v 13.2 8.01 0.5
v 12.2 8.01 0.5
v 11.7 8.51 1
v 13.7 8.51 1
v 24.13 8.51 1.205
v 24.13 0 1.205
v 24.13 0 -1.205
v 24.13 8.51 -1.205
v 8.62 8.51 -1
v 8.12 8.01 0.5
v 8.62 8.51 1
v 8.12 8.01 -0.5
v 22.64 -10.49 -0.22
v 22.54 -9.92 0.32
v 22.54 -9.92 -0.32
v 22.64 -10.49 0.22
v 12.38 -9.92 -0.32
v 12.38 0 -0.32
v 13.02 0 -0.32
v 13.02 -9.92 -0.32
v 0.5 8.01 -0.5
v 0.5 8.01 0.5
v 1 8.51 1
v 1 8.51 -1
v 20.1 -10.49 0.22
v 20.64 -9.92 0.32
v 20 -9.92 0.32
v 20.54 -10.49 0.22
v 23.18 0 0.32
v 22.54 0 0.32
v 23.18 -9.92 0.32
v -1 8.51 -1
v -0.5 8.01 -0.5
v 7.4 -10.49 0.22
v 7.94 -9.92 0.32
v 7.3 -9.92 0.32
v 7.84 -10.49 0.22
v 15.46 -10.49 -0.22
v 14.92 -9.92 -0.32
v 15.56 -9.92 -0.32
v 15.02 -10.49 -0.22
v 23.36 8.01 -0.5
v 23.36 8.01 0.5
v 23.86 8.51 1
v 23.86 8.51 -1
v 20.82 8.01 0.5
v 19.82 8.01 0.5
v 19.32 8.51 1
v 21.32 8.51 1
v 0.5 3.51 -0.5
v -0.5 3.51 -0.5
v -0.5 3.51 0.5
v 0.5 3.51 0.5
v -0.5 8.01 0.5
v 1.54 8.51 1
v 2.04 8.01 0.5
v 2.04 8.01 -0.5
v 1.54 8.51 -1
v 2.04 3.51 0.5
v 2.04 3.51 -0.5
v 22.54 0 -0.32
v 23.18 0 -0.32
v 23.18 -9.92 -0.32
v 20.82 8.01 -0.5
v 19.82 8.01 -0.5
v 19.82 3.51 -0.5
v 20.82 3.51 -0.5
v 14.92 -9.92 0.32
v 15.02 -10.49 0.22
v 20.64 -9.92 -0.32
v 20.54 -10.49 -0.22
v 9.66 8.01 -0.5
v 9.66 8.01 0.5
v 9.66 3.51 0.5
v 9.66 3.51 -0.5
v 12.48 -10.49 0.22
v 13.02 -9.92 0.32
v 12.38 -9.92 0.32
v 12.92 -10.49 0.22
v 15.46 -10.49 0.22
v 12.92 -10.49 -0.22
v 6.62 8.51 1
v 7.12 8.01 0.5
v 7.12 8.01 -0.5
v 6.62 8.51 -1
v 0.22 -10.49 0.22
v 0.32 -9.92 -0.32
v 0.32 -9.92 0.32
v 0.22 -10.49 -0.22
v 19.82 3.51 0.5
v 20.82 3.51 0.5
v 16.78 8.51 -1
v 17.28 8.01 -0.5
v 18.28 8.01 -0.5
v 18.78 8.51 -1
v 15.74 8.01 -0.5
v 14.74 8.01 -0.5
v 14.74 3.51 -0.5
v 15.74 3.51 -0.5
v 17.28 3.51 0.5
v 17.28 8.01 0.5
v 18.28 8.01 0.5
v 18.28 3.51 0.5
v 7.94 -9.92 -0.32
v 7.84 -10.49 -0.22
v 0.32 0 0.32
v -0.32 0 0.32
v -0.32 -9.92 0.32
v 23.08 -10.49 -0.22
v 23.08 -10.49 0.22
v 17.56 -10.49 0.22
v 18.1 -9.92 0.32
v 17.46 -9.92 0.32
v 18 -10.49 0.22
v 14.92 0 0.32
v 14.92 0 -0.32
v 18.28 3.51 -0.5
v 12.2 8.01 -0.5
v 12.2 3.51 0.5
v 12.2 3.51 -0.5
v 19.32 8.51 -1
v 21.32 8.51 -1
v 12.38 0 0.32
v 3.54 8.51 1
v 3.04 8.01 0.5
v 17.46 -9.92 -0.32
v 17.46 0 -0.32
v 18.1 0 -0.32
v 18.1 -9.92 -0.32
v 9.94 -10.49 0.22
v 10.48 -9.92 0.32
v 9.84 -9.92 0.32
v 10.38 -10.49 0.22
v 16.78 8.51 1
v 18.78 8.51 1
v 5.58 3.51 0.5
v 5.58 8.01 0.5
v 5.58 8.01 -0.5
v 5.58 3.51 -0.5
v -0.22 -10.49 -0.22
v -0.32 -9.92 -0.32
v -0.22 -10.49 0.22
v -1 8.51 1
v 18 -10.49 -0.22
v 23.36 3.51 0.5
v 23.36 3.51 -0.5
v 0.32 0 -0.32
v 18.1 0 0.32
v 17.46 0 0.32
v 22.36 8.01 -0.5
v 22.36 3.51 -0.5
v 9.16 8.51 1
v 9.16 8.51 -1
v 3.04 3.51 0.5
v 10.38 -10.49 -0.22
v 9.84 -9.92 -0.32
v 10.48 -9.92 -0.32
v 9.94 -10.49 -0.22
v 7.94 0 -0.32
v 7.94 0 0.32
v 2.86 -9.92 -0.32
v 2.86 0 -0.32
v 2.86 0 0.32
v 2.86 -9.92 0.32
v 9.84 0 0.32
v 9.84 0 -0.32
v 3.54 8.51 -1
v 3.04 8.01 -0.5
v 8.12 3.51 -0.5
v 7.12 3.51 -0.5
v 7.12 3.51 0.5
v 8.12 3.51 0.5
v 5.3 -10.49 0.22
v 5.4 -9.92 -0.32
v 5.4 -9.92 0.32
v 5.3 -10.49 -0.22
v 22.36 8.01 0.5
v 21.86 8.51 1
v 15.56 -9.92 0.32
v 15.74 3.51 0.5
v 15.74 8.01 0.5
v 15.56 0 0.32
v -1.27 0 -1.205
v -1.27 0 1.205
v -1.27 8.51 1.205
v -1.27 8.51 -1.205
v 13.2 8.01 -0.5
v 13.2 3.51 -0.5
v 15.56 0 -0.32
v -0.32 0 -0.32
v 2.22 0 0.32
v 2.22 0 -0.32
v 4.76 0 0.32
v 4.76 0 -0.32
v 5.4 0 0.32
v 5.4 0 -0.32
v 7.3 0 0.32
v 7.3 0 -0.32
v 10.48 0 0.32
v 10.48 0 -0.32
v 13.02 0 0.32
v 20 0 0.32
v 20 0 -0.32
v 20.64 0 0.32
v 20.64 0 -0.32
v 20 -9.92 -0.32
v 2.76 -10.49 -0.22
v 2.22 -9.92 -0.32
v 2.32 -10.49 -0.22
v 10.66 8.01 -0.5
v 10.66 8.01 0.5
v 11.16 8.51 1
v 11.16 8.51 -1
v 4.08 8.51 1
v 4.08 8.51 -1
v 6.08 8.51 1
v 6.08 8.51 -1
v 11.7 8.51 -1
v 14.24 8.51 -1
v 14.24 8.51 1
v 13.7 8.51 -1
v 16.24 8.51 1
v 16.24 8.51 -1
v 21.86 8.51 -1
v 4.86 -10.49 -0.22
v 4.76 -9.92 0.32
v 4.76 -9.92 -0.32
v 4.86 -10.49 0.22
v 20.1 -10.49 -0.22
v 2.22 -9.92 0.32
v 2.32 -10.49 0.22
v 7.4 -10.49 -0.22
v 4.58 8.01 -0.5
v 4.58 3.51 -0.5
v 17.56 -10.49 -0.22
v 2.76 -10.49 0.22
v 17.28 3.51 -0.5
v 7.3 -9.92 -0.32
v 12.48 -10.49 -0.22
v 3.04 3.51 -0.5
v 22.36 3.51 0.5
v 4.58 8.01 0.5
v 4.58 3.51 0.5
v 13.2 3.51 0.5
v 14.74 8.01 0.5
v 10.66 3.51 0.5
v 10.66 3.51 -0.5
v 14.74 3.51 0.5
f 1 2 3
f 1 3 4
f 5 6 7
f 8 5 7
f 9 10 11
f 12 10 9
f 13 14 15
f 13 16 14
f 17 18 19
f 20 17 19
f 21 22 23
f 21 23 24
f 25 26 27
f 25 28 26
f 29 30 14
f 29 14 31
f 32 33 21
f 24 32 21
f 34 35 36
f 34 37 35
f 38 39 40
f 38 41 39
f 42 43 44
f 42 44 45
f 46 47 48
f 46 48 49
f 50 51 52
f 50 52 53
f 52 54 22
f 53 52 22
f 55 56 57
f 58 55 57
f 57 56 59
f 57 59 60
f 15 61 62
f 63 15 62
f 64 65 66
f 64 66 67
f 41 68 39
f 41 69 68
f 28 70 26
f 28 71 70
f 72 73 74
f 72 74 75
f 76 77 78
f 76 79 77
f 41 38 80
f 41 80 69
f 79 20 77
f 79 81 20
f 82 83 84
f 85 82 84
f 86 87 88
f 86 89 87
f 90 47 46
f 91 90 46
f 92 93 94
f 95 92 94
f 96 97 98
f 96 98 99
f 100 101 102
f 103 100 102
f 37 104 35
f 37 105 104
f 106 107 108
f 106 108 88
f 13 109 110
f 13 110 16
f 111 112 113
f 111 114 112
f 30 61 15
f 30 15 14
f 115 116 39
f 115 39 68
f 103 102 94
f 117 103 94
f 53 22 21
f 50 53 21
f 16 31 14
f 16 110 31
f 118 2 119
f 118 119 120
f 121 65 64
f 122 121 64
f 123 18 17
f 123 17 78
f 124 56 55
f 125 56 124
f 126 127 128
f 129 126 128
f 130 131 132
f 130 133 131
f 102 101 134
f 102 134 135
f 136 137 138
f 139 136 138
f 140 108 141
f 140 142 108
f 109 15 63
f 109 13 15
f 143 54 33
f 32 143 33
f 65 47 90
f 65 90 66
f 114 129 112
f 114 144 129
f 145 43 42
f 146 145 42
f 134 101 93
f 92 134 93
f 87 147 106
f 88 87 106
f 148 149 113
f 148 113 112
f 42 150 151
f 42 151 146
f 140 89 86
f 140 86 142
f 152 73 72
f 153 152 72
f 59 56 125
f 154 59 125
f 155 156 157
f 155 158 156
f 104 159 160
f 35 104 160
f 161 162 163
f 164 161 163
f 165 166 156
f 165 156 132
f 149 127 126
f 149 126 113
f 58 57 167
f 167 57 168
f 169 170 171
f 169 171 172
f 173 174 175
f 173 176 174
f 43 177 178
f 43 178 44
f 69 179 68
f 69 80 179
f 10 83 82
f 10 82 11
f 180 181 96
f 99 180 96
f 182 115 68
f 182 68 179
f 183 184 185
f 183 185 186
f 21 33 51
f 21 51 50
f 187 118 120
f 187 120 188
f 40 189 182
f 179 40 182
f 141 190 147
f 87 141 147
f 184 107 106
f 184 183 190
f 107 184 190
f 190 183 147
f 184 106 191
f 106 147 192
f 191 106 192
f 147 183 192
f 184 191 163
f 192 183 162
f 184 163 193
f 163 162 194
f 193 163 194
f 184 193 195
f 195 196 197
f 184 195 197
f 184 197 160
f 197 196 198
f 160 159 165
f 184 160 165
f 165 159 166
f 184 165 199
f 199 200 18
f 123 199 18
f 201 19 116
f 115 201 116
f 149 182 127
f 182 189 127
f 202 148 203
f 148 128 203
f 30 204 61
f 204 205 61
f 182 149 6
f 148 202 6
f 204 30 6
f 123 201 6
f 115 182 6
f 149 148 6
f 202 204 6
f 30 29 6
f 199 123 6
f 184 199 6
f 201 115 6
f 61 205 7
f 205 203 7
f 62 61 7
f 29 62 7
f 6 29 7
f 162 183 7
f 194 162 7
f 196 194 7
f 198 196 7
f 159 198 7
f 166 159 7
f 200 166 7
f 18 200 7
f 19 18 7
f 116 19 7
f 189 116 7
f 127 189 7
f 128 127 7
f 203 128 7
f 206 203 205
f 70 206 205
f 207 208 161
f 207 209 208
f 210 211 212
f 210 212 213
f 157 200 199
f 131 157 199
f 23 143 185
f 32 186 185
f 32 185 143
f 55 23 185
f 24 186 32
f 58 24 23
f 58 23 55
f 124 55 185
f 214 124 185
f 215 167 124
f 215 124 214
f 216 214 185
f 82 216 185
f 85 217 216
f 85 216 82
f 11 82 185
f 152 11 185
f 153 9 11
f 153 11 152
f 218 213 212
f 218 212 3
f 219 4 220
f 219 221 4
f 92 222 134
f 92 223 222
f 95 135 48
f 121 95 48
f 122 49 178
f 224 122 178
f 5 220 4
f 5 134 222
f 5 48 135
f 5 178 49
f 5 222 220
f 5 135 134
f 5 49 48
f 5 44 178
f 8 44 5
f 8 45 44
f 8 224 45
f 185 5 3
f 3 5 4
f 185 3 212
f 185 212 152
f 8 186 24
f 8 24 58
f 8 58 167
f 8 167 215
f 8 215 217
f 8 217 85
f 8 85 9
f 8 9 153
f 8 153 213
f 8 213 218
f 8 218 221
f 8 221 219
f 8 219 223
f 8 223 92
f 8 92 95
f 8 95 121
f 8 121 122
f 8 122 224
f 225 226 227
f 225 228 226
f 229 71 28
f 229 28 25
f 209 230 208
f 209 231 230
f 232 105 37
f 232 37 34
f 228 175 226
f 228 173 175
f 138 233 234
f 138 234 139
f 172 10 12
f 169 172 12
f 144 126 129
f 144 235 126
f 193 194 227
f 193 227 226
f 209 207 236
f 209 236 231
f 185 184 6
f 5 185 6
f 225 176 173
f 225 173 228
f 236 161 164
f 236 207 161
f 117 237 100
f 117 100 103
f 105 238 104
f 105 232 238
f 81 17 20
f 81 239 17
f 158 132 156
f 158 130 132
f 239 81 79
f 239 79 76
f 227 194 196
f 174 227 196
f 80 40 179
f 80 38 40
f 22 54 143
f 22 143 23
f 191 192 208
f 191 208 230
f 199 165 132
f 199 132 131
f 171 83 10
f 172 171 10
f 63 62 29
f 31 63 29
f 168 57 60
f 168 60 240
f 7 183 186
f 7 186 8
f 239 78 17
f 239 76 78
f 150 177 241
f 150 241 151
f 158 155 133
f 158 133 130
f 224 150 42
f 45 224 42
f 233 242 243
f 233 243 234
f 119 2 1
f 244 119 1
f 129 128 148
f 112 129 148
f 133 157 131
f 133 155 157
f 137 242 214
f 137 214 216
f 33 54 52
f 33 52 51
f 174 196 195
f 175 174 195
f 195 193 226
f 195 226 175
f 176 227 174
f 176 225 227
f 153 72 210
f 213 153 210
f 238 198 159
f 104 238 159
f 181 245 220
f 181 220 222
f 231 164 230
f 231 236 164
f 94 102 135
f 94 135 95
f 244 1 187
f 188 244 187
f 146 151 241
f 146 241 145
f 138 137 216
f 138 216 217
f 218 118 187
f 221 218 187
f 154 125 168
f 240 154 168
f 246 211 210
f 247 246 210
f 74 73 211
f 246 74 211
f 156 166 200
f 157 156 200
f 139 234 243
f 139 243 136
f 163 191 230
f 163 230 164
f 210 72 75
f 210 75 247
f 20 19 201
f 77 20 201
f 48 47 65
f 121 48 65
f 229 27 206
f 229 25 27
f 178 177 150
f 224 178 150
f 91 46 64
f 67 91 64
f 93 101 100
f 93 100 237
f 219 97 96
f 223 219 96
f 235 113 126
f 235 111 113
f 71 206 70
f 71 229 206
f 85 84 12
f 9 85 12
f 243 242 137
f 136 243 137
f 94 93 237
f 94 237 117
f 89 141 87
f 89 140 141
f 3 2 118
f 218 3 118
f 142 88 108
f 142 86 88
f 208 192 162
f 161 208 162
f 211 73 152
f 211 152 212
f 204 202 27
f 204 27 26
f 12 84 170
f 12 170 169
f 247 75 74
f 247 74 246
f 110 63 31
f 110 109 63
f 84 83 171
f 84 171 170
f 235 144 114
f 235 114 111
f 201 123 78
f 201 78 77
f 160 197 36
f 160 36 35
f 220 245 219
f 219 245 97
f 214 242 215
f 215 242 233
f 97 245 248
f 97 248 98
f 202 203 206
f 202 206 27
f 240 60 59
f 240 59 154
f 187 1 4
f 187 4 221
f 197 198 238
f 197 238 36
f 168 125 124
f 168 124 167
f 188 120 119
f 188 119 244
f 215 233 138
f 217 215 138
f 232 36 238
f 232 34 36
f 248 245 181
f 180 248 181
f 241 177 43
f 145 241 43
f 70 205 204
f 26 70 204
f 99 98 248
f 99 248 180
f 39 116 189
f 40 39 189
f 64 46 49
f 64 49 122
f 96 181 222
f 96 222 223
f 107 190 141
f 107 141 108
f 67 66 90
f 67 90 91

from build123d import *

# Parameters (mm, degrees)
SKETCH2_W                  = 25.4
SKETCH2_H                  = 2.41
BOSS_EXTRUDE1_DEPTH        = 8.51
SKETCH5_W                  = 1
SKETCH5_H                  = 1
CUT_EXTRUDE1_DEPTH         = 5
CHAMFER1_SIZE              = 0.5
LPATTERN3_COUNT            = 10
LPATTERN3_PITCH            = 2.54
CHAMFER1_OF_LPATTERN3_SIZE = 0.5
SKETCH11_W                 = 0.64
SKETCH11_H                 = 0.64
BOSS_EXTRUDE2_DEPTH        = 9.92
LPATTERN4_COUNT            = 10
LPATTERN4_PITCH            = 2.54


with BuildPart() as part:
    # Sketch2 → Boss-Extrude1 (new body)
    with BuildSketch(Plane(origin=(0, 0, 0), x_dir=(1, 0, 0), z_dir=(0, 1, 0))):
        with Locations((11.43, 0)):
            Rectangle(SKETCH2_W, SKETCH2_H)
    extrude(amount=BOSS_EXTRUDE1_DEPTH)

    # Sketch5 → Cut-Extrude1 (cut)
    with BuildSketch(Plane(origin=(0, 8.51, 0), x_dir=(1, 0, 0), z_dir=(0, 1, 0))):
        Rectangle(SKETCH5_W, SKETCH5_H)
    cut_extrude1 = extrude(amount=-CUT_EXTRUDE1_DEPTH, mode=Mode.SUBTRACT)

    # Chamfer1
    chamfer1_edges = [part.edges().sort_by_distance(p)[0] for p in [
        (0.5, 8.51, 0),
        (0, 8.51, -0.5),
        (-0.5, 8.51, 0),
        (0, 8.51, 0.5),
    ]]
    chamfer(chamfer1_edges, length=CHAMFER1_SIZE)

    # LPattern3: Cut-Extrude1 ×10
    with Locations(*[(i * LPATTERN3_PITCH, 0, 0) for i in range(1, LPATTERN3_COUNT)]):
        add(cut_extrude1, mode=Mode.SUBTRACT)

    # Chamfer1 of LPattern3
    chamfer1_of_lpattern3_edges = [part.edges().sort_by_distance(p)[0] for p in [
        (3.04, 8.51, 0),
        (2.54, 8.51, -0.5),
        (2.04, 8.51, 0),
        (2.54, 8.51, 0.5),
        (5.58, 8.51, 0),
        (5.08, 8.51, -0.5),
        (4.58, 8.51, 0),
        (5.08, 8.51, 0.5),
        (8.12, 8.51, 0),
        (7.62, 8.51, -0.5),
        (7.12, 8.51, 0),
        (7.62, 8.51, 0.5),
        (10.66, 8.51, 0),
        (10.16, 8.51, -0.5),
        (9.66, 8.51, 0),
        (10.16, 8.51, 0.5),
        (13.2, 8.51, 0),
        (12.7, 8.51, -0.5),
        (12.2, 8.51, 0),
        (12.7, 8.51, 0.5),
        (15.74, 8.51, 0),
        (15.24, 8.51, -0.5),
        (14.74, 8.51, 0),
        (15.24, 8.51, 0.5),
        (18.28, 8.51, 0),
        (17.78, 8.51, -0.5),
        (17.28, 8.51, 0),
        (17.78, 8.51, 0.5),
        (20.82, 8.51, 0),
        (20.32, 8.51, -0.5),
        (19.82, 8.51, 0),
        (20.32, 8.51, 0.5),
        (23.36, 8.51, 0),
        (22.86, 8.51, -0.5),
        (22.36, 8.51, 0),
        (22.86, 8.51, 0.5),
    ]]
    chamfer(chamfer1_of_lpattern3_edges, length=CHAMFER1_OF_LPATTERN3_SIZE)

    # Sketch11 → Boss-Extrude2 (add)
    with BuildSketch(Plane.XZ):
        Rectangle(SKETCH11_W, SKETCH11_H)
    boss_extrude2 = extrude(amount=BOSS_EXTRUDE2_DEPTH)

    # Sketch13 → Loft1 section 0
    with BuildSketch(Plane.XZ.offset(9.92)):
        with BuildLine():
            Line((0.32, -0.32), (0.32, 0.32))
            Line((0.32, 0.32), (-0.32, 0.32))
            Line((-0.32, 0.32), (-0.32, -0.32))
            Line((-0.32, -0.32), (0.32, -0.32))
        make_face()
    # Sketch14 → Loft1 section 1
    with BuildSketch(Plane(origin=(0, -10.49, 0), x_dir=(-1, 0, 0), z_dir=(0, -1, 0))):
        with BuildLine():
            Line((-0.22, 0.22), (0.22, 0.22))
            Line((0.22, 0.22), (0.22, -0.22))
            Line((0.22, -0.22), (-0.22, -0.22))
            Line((-0.22, -0.22), (-0.22, 0.22))
        make_face()
    loft1 = loft()

    # LPattern4: Boss-Extrude2, Loft1 ×10
    with Locations(*[(i * LPATTERN4_PITCH, 0, 0) for i in range(1, LPATTERN4_COUNT)]):
        add(boss_extrude2)
        add(loft1)


solid = part.part
